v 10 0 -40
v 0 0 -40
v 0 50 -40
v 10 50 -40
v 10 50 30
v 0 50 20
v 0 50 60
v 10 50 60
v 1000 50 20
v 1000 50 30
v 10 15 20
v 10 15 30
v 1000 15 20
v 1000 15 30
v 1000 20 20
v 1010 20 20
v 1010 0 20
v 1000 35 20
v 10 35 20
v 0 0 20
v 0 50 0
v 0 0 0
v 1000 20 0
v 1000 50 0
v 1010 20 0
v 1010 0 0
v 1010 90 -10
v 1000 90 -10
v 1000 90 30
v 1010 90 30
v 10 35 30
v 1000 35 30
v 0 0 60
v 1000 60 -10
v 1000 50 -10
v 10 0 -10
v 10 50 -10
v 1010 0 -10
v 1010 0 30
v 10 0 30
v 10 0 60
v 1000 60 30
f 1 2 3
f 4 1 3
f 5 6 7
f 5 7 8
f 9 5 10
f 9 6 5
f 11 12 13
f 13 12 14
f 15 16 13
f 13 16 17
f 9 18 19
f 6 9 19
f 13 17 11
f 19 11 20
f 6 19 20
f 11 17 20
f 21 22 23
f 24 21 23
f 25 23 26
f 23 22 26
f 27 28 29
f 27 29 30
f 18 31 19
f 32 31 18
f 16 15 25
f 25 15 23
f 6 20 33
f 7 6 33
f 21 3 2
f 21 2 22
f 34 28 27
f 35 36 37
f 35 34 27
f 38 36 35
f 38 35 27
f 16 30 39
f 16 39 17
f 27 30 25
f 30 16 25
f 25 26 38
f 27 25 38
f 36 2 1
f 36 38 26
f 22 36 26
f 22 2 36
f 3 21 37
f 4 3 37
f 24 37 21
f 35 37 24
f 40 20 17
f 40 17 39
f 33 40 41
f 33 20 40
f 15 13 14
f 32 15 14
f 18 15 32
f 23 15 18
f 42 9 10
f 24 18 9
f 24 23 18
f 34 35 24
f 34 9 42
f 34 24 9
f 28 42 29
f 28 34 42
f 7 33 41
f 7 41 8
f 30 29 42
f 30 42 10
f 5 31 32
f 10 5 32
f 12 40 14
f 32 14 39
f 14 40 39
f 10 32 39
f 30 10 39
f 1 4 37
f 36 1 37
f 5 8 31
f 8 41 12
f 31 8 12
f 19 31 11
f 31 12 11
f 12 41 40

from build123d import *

# Parameters (mm, degrees)
EXTRUDE_1_DEPTH          = 60
SKETCH_2_W               = 10
SKETCH_2_H               = 40
EXTRUDE_1_2_DEPTH        = 30
SKETCH_3_W               = 40
SKETCH_3_H               = 60
EXTRUDE_2_DEPTH          = 10
CUT_EXTRUDE_1_DEPTH      = 1017.415269464
CUT_EXTRUDE_1_DEPTH_BACK = 1017.415269464
SKETCH_4_W               = 1028.133255753
SKETCH_4_H               = 25
SKETCH_5_W               = 990
SKETCH_5_H               = 10
CUT_EXTRUDE_2_DEPTH      = 16
CUT_EXTRUDE_3_DEPTH      = 1016.775565762
CUT_EXTRUDE_3_DEPTH_BACK = 1016.775565762
SKETCH_7_W               = 20
SKETCH_7_H               = 20


with BuildPart() as part:
    # 草图1 → Extrude 1 (new body)
    with BuildSketch(Plane(origin=(0, 0, 0), x_dir=(1, 0, 0), z_dir=(0, 1, 0))):
        Polygon((0, 10.786516854), (0, 0), (1000, 0), (1000, -20), (0, -20), (0, -30.786516854), (10, -30.786516854), (10, -30), (1010, -30), (1010, 10), (10, 10), (10, 10.786516854), align=None)
    extrude(amount=EXTRUDE_1_DEPTH)

    # 草图2 → Extrude 1 2 (add)
    with BuildSketch(Plane(origin=(0, 60, 0), x_dir=(1, 0, 0), z_dir=(0, 1, 0))):
        with Locations((1005, -10)):
            Rectangle(SKETCH_2_W, SKETCH_2_H)
    extrude(amount=EXTRUDE_1_2_DEPTH)

    # 草图3 → 凸台-拉伸2 (add)
    with BuildSketch(Plane.ZY):
        with Locations((-20, 30)):
            Rectangle(SKETCH_3_W, SKETCH_3_H)
        with Locations((40, 30)):
            Rectangle(SKETCH_3_W, SKETCH_3_H)
    extrude(amount=-EXTRUDE_2_DEPTH)

    # 草图4 → 切除-拉伸1 (cut, two sides: drawn at the far end of the back side and taken through both)
    with BuildSketch(Plane.XY.offset(30).offset(-CUT_EXTRUDE_1_DEPTH_BACK)):
        with Locations((485.933372124, 62.5)):
            Rectangle(SKETCH_4_W, SKETCH_4_H)
    extrude(amount=CUT_EXTRUDE_1_DEPTH + CUT_EXTRUDE_1_DEPTH_BACK, mode=Mode.SUBTRACT)

    # 草图5 → 切除-拉伸2 (cut, symmetric)
    with BuildSketch(Plane.XY.offset(30)):
        with Locations((505, 30)):
            Rectangle(SKETCH_5_W, SKETCH_5_H)
        with Locations((505, 20)):
            Rectangle(SKETCH_5_W, SKETCH_5_H)
    extrude(amount=CUT_EXTRUDE_2_DEPTH, both=True, mode=Mode.SUBTRACT)

    # 草图7 → 切除-拉伸3 (cut, two sides: drawn at the far end of the back side and taken through both)
    with BuildSketch(Plane(origin=(1010, 0, 0), x_dir=(0, 0, -1), z_dir=(1, 0, 0)).offset(-CUT_EXTRUDE_3_DEPTH_BACK)):
        with Locations((-10, 10)):
            Rectangle(SKETCH_7_W, SKETCH_7_H)
    extrude(amount=CUT_EXTRUDE_3_DEPTH + CUT_EXTRUDE_3_DEPTH_BACK, mode=Mode.SUBTRACT)


solid = part.part
